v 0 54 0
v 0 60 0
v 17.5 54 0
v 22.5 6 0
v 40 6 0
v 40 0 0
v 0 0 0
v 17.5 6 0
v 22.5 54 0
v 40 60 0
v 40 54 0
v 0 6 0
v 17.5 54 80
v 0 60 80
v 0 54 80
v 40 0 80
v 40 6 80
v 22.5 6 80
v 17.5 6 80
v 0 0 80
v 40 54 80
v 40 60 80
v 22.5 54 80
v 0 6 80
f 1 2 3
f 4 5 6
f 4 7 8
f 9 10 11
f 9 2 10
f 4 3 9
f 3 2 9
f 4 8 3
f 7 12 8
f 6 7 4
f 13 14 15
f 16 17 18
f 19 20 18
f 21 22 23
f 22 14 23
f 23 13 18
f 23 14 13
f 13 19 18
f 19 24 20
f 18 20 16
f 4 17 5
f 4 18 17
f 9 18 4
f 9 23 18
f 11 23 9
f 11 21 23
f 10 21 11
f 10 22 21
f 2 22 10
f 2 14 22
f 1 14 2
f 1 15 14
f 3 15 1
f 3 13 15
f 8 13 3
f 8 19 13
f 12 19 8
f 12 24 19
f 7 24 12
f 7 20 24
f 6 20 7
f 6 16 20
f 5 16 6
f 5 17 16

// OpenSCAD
$fn = 32;

// ----------------------------------------------------------------------
// Structural section: ibeam 40 x 60 mm
// ----------------------------------------------------------------------

// --- parameters (mm) ---
sec_w = 40;               // section width, X
sec_h = 60;               // section height, Y
flange_t = 6;             // flange thickness
web_t = 5;                // web thickness
plate_t = 80;             // cut length, Z (extrusion height)

profile = [[0, 0], [40, 0], [40, 6], [22.5, 6], [22.5, 54], [40, 54], [40, 60], [0, 60], [0, 54], [17.5, 54], [17.5, 6], [0, 6]];  // primary outline, 12 points, counter clockwise

// --- the one profile operation ---
linear_extrude(height = plate_t) polygon(points = profile);
